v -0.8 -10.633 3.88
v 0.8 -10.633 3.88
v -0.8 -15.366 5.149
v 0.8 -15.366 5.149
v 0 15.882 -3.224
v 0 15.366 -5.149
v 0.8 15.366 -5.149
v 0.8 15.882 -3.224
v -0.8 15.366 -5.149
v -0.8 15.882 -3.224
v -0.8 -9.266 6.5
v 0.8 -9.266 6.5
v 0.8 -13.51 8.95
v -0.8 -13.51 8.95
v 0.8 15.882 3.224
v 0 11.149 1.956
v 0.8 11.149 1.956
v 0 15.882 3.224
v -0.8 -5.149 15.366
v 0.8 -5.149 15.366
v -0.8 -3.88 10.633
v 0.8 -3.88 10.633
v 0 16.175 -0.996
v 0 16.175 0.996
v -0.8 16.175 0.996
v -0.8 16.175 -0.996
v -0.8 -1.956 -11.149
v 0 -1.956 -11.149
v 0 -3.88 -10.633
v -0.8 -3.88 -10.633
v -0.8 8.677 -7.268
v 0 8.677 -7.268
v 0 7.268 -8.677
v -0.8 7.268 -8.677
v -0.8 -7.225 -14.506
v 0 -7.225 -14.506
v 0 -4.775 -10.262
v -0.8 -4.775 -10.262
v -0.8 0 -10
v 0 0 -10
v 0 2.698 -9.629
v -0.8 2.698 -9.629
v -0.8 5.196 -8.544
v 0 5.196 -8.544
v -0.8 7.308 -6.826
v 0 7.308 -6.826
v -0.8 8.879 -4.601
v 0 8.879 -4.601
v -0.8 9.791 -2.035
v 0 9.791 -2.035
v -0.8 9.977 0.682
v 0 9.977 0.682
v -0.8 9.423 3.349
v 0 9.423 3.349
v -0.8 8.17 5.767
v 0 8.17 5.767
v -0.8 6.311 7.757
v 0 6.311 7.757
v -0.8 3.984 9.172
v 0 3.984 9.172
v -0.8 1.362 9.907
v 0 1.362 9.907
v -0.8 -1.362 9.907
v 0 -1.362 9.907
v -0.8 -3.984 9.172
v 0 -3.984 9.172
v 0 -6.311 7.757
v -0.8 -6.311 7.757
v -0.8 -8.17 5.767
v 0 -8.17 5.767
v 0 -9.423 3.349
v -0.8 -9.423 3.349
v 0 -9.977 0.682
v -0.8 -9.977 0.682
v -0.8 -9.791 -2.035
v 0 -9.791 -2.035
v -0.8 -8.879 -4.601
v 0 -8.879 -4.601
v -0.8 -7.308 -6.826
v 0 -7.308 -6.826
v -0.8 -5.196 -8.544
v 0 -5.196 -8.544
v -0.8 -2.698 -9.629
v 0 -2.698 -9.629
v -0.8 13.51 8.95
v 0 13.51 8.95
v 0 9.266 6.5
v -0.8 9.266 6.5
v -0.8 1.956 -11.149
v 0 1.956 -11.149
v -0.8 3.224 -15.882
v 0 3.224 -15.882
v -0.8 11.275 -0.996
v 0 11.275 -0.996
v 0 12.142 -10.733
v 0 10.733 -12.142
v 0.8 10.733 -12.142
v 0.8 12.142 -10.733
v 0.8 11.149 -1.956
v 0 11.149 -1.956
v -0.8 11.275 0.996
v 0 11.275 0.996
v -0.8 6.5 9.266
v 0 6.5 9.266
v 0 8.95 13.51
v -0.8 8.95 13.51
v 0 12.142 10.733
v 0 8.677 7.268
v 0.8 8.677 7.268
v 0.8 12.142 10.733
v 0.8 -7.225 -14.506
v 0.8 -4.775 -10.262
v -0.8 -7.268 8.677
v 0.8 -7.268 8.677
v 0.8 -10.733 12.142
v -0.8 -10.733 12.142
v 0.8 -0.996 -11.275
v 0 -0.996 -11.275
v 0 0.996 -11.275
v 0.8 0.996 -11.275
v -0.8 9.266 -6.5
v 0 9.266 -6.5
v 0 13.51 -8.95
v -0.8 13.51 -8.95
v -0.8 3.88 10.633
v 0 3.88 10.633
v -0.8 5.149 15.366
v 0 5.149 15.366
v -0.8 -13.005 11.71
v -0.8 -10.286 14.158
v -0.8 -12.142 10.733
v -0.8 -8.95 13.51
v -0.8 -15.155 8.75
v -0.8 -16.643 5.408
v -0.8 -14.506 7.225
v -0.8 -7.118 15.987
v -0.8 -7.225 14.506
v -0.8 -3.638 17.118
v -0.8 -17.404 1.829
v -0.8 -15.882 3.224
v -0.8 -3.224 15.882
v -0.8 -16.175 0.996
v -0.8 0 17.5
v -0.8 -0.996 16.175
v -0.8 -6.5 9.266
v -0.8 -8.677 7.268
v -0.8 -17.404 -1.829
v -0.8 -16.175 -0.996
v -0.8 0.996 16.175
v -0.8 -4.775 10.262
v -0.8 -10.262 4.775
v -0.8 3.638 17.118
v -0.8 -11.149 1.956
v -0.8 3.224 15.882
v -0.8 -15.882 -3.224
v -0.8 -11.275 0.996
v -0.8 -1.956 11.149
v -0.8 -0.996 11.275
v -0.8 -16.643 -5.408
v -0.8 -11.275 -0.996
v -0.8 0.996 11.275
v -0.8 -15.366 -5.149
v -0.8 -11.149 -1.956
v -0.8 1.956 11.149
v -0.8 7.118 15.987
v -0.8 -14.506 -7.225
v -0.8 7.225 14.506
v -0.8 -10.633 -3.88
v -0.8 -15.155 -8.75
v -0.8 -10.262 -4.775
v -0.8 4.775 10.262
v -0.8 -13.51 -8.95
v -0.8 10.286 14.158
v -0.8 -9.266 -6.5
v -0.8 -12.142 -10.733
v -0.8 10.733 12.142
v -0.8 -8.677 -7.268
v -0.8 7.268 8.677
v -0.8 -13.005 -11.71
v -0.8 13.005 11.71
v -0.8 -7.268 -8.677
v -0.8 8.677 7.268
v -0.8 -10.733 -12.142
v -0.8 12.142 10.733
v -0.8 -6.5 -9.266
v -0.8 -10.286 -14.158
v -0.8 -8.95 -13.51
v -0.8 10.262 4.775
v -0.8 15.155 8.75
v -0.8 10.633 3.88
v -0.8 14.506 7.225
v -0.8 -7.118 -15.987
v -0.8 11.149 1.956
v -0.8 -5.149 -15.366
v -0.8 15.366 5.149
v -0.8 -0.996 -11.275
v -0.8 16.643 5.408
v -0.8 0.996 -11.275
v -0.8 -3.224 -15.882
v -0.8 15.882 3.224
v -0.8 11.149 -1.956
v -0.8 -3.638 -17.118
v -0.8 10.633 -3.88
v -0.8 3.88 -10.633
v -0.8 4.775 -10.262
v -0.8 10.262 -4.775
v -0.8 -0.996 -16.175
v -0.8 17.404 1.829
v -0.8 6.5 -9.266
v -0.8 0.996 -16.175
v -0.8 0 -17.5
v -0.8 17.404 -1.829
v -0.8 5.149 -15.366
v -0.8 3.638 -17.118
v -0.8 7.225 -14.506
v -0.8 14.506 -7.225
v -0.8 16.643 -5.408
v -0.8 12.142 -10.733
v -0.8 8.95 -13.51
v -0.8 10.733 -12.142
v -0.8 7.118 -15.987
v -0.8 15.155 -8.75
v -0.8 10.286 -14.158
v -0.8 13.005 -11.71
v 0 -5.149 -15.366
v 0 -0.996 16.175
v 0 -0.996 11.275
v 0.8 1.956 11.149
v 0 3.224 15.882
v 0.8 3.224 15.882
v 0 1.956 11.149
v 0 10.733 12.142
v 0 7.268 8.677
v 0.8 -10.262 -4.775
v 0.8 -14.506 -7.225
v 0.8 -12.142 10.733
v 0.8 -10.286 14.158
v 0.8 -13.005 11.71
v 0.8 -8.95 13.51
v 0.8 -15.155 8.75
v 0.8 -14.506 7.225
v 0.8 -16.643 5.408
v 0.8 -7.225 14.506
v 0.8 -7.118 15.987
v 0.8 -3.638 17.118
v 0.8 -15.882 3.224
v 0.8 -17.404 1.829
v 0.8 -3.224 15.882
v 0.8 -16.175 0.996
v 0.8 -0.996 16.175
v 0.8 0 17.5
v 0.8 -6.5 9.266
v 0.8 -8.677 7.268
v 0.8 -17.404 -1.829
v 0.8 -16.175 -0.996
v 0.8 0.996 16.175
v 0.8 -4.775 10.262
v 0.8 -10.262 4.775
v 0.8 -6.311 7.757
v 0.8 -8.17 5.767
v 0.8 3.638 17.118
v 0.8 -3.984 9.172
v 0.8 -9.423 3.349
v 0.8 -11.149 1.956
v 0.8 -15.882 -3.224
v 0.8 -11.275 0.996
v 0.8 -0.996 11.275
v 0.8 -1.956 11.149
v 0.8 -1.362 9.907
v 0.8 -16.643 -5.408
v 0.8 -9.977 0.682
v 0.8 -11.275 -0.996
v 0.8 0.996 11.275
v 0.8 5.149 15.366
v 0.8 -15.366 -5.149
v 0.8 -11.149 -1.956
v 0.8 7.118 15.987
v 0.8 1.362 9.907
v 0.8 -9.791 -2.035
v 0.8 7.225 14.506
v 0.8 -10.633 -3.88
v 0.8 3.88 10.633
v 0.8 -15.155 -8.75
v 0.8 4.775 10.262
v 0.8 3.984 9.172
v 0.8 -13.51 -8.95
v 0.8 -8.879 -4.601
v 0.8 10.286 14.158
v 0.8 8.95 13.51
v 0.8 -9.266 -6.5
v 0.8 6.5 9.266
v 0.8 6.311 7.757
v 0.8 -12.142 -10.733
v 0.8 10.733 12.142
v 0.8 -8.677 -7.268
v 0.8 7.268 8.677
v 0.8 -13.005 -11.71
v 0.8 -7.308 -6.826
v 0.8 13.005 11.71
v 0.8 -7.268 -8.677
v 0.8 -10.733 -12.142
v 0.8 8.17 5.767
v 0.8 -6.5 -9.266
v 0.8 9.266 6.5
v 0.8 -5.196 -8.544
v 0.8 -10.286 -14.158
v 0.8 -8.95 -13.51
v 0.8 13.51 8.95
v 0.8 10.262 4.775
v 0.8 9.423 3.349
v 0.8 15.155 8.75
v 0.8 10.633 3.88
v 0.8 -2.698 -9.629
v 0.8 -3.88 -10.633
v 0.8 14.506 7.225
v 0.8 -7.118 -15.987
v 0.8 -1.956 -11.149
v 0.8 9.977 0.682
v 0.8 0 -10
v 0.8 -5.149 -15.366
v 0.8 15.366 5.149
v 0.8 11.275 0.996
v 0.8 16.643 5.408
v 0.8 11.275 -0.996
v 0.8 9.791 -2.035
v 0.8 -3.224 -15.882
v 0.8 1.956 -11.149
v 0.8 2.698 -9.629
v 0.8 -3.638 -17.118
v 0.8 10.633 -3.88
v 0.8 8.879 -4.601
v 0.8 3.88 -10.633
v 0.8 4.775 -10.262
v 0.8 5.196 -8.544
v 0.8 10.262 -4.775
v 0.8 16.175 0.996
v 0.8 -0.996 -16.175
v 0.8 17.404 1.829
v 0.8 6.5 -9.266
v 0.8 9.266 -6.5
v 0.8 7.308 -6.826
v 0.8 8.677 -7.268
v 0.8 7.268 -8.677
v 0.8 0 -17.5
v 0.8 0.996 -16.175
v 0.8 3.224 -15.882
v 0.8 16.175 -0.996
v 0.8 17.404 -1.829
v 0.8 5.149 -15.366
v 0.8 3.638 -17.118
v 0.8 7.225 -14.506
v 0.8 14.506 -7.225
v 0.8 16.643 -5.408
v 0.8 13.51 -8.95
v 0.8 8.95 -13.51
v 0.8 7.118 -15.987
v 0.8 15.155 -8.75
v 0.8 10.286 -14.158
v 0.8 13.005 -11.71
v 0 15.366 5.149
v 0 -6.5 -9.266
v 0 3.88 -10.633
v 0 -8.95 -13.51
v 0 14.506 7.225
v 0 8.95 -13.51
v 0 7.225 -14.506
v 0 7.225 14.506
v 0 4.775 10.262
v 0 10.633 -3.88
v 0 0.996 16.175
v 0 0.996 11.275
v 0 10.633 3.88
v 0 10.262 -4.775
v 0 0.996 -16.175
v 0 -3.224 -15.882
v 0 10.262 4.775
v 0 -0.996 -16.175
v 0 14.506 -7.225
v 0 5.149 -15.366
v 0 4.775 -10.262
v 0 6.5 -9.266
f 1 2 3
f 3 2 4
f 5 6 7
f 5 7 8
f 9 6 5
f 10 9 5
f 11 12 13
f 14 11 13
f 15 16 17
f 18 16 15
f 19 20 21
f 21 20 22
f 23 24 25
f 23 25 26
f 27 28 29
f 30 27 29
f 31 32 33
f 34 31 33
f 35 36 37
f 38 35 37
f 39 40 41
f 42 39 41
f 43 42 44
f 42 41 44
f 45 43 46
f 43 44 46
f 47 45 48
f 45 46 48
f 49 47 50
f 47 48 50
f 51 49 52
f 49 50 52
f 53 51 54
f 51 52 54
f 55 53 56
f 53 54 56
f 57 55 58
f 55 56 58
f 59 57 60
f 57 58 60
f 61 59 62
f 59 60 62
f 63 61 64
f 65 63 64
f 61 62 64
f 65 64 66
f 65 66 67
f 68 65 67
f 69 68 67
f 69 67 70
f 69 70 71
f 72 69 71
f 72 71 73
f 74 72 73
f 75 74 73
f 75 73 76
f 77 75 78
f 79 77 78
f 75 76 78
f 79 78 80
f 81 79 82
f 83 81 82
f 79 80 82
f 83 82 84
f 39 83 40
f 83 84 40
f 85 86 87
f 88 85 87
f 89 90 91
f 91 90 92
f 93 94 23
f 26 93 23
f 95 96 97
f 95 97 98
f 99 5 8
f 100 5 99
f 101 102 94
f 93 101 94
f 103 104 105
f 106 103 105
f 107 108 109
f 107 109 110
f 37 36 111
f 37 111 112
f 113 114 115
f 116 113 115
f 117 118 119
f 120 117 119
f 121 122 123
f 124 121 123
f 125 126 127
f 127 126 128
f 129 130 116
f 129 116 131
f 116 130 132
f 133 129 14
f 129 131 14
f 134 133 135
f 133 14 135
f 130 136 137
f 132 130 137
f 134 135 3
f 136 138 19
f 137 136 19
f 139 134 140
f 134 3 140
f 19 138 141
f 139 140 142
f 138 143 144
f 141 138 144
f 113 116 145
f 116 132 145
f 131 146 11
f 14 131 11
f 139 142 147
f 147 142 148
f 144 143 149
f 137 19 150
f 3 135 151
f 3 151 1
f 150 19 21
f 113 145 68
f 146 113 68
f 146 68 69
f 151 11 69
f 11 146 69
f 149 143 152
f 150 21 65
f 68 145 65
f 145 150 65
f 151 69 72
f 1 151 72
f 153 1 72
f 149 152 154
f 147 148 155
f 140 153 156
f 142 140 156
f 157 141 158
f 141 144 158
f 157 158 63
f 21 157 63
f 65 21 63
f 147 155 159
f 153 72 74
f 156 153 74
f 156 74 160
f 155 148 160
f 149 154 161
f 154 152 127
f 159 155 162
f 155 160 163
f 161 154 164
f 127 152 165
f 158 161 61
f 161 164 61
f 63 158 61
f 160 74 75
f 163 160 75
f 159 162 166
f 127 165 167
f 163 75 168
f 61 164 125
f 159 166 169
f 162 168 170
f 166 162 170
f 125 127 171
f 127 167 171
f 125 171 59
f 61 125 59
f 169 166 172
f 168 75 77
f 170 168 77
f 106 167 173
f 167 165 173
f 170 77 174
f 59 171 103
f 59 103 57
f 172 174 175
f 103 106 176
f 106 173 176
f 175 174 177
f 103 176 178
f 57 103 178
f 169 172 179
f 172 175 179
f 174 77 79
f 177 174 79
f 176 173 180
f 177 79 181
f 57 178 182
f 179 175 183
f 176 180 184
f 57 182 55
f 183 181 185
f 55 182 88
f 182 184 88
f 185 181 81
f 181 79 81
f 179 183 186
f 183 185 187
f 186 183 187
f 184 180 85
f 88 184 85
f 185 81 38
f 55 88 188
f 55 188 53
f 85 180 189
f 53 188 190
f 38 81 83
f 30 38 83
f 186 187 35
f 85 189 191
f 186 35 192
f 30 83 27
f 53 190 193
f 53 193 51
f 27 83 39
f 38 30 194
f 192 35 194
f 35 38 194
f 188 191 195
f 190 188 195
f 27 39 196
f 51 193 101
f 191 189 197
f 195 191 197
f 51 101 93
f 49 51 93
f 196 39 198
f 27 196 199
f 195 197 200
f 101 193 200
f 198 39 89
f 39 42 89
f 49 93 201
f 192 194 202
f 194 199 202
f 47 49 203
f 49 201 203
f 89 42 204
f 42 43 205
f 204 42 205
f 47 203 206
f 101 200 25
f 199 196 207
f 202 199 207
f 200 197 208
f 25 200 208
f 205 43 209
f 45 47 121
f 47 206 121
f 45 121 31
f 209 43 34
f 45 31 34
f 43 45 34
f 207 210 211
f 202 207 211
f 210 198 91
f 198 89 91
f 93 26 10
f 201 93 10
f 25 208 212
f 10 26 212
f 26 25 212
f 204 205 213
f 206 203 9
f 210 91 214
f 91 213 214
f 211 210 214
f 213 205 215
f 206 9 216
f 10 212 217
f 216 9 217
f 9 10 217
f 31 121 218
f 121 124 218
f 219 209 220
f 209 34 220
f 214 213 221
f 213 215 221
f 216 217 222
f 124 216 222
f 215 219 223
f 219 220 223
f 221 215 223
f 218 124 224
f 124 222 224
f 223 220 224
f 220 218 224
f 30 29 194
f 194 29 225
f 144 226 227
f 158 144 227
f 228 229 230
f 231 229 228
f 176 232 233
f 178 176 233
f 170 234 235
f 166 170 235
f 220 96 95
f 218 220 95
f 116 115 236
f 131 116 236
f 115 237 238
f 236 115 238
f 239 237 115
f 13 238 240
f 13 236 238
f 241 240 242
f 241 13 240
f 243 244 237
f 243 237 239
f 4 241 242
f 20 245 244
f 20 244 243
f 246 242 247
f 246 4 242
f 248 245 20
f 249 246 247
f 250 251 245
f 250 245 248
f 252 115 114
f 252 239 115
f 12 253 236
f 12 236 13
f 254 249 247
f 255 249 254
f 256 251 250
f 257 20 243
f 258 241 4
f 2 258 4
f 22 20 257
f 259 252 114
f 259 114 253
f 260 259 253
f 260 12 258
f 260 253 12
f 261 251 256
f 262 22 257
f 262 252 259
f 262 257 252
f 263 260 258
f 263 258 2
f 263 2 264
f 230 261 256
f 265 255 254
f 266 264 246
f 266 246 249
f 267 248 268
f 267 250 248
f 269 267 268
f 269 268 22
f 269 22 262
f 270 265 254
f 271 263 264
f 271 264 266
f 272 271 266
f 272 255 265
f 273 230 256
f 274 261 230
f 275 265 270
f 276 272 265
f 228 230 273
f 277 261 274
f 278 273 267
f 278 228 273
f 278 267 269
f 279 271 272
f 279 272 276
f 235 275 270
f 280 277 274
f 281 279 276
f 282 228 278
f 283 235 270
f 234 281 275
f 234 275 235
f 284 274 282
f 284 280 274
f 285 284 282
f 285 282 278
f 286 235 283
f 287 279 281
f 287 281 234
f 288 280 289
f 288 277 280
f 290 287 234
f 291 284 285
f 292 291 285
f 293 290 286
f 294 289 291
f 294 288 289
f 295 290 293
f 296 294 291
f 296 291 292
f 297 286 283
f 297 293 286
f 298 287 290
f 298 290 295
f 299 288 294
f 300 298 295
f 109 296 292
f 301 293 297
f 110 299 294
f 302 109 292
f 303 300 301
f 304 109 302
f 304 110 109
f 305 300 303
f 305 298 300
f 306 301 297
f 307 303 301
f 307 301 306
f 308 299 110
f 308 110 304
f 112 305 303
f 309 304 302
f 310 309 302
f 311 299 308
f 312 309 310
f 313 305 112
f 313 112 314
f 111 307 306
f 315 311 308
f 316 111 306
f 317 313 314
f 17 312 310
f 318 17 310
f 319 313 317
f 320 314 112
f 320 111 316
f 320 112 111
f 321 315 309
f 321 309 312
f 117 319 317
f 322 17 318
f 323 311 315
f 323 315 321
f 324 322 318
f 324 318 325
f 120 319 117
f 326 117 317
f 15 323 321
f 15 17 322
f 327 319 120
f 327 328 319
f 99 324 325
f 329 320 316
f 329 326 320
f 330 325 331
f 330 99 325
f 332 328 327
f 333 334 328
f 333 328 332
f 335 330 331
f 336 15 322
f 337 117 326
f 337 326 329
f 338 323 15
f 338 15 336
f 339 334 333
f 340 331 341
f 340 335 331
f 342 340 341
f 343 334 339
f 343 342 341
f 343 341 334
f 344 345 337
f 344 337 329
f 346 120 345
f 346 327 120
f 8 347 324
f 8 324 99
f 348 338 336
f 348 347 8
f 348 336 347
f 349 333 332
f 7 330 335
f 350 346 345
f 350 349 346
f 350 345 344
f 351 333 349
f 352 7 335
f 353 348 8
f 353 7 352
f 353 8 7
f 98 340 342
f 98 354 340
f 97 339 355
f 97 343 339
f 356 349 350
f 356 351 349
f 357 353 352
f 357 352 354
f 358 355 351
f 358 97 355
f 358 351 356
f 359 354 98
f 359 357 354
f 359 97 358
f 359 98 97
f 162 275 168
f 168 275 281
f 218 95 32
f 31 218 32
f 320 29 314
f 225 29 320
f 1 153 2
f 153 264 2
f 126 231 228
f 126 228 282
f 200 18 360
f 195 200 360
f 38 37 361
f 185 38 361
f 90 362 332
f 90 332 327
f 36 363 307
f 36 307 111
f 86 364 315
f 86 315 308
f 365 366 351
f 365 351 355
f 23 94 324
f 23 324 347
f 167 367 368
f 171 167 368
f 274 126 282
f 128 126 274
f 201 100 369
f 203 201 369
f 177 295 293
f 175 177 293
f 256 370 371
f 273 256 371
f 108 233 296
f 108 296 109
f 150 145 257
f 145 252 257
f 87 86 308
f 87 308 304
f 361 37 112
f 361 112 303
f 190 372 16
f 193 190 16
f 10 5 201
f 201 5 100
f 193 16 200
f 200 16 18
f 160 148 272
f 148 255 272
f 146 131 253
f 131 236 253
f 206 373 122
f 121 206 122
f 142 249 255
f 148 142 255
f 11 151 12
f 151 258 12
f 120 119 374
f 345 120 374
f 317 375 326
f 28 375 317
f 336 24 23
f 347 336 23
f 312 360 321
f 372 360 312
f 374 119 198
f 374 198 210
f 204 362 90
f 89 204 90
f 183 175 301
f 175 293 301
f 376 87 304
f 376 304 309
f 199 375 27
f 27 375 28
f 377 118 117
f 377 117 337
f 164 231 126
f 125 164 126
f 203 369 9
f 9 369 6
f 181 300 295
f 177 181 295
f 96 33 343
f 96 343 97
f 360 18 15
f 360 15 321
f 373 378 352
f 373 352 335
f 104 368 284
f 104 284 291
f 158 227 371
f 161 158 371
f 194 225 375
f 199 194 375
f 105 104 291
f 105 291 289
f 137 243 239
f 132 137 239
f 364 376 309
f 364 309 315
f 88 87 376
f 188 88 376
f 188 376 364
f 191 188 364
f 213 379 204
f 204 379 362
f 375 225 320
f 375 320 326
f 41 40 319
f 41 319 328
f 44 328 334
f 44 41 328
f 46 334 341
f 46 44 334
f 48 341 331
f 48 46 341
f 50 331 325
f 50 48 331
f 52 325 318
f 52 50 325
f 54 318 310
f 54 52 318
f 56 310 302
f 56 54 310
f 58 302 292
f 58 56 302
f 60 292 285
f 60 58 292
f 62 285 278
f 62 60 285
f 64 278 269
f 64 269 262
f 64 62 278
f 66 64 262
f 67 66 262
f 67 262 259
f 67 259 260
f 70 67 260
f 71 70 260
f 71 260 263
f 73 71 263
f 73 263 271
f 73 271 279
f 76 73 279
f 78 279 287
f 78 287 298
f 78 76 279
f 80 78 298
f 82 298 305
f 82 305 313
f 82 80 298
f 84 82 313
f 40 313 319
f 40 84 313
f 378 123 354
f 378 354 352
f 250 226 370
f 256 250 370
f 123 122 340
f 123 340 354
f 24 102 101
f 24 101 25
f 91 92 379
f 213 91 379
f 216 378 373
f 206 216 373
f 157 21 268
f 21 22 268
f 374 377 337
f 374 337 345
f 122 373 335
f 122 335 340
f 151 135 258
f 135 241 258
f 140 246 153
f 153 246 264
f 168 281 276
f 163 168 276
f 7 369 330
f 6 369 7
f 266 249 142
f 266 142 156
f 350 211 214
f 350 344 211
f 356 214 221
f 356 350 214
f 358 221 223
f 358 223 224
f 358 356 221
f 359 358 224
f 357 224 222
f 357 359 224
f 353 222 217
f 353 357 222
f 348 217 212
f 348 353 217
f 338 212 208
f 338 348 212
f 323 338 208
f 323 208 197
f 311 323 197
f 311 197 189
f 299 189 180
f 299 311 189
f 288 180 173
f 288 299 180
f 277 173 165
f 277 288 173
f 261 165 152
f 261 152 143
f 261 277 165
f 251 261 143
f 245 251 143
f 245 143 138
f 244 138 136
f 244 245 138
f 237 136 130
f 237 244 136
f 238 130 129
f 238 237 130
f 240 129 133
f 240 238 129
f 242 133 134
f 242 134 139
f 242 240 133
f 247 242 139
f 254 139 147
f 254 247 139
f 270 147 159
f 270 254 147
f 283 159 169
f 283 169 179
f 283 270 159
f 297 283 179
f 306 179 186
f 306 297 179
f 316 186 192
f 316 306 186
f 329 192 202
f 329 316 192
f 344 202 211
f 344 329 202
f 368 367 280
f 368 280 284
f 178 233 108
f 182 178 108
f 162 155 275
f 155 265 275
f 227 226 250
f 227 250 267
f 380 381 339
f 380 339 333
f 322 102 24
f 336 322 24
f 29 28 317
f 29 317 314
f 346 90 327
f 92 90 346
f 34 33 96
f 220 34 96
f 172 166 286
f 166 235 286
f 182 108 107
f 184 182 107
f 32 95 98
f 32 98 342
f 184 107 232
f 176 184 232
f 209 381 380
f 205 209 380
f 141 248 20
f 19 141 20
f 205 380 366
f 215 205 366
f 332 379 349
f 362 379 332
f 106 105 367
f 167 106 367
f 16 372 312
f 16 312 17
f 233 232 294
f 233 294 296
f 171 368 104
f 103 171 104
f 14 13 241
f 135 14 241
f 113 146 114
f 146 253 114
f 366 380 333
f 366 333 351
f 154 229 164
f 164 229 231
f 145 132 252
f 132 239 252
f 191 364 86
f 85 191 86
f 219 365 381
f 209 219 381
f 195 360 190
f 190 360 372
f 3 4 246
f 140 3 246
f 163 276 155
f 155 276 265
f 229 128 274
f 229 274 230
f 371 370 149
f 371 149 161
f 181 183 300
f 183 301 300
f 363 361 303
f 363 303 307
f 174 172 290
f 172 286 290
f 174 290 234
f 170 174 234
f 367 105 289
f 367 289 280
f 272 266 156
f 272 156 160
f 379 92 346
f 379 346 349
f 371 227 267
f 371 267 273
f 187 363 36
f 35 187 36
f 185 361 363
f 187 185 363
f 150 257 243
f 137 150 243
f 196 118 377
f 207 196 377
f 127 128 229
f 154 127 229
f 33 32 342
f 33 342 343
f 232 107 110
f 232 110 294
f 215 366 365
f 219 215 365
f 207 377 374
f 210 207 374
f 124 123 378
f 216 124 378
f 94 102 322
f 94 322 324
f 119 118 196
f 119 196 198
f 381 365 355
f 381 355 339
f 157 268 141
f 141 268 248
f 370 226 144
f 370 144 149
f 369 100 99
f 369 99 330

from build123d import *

# Parameters (mm, degrees)
BOSS_EXTRUDE1_DEPTH      = 0.8
BOSS_EXTRUDE1_DEPTH_BACK = 0.8
SKETCH1_R                = 17.5
SKETCH1_R_2              = 10
SKETCH1_W                = 4.9
SKETCH1_H                = 1.992179872
SKETCH1_W_2              = 1.992179872
SKETCH1_H_2              = 4.9


with BuildPart() as part:
    # Sketch1 → Boss-Extrude1 (new, two sides: drawn at the far end of the back side and taken through both)
    with BuildSketch(Plane(origin=(0, 0, 0), x_dir=(0, 0, -1), z_dir=(1, 0, 0)).offset(-BOSS_EXTRUDE1_DEPTH_BACK)):
        Circle(SKETCH1_R)
        Circle(SKETCH1_R_2, mode=Mode.SUBTRACT)
        with Locations((13.725, 0)):
            Rectangle(SKETCH1_W, SKETCH1_H, mode=Mode.SUBTRACT)
        Polygon((10.633006645, 3.880333728), (11.148620737, 1.956035739), (15.881657286, 3.22424906), (15.366043194, 5.148547049), align=None, mode=Mode.SUBTRACT)
        Polygon((10.633006645, -3.880333728), (15.366043194, -5.148547049), (15.881657286, -3.22424906), (11.148620737, -1.956035739), align=None, mode=Mode.SUBTRACT)
        Polygon((9.26639146, 6.500139189), (10.262481396, 4.774860811), (14.506005874, 7.224860811), (13.509915938, 8.950139189), align=None, mode=Mode.SUBTRACT)
        Polygon((9.26639146, -6.500139189), (13.509915938, -8.950139189), (14.506005874, -7.224860811), (10.262481396, -4.774860811), align=None, mode=Mode.SUBTRACT)
        Polygon((7.26828701, 8.676970906), (8.676970906, 7.26828701), (12.141794134, 10.733110237), (10.733110237, 12.141794134), align=None, mode=Mode.SUBTRACT)
        Polygon((7.26828701, -8.676970906), (10.733110237, -12.141794134), (12.141794134, -10.733110237), (8.676970906, -7.26828701), align=None, mode=Mode.SUBTRACT)
        Polygon((4.774860811, 10.262481396), (6.500139189, 9.26639146), (8.950139189, 13.509915938), (7.224860811, 14.506005874), align=None, mode=Mode.SUBTRACT)
        Polygon((4.774860811, -10.262481396), (7.224860811, -14.506005874), (8.950139189, -13.509915938), (6.500139189, -9.26639146), align=None, mode=Mode.SUBTRACT)
        Polygon((1.956035739, 11.148620737), (3.880333728, 10.633006645), (5.148547049, 15.366043194), (3.22424906, 15.881657286), align=None, mode=Mode.SUBTRACT)
        Polygon((1.956035739, -11.148620737), (3.22424906, -15.881657286), (5.148547049, -15.366043194), (3.880333728, -10.633006645), align=None, mode=Mode.SUBTRACT)
        with Locations((0, 13.725)):
            Rectangle(SKETCH1_W_2, SKETCH1_H_2, mode=Mode.SUBTRACT)
        with Locations((0, -13.725)):
            Rectangle(SKETCH1_W_2, SKETCH1_H_2, mode=Mode.SUBTRACT)
        Polygon((-5.148547049, 15.366043194), (-3.880333728, 10.633006645), (-1.956035739, 11.148620737), (-3.22424906, 15.881657286), align=None, mode=Mode.SUBTRACT)
        Polygon((-5.148547049, -15.366043194), (-3.22424906, -15.881657286), (-1.956035739, -11.148620737), (-3.880333728, -10.633006645), align=None, mode=Mode.SUBTRACT)
        Polygon((-8.950139189, 13.509915938), (-6.500139189, 9.26639146), (-4.774860811, 10.262481396), (-7.224860811, 14.506005874), align=None, mode=Mode.SUBTRACT)
        Polygon((-8.950139189, -13.509915938), (-7.224860811, -14.506005874), (-4.774860811, -10.262481396), (-6.500139189, -9.26639146), align=None, mode=Mode.SUBTRACT)
        Polygon((-12.141794134, 10.733110237), (-8.676970906, 7.26828701), (-7.26828701, 8.676970906), (-10.733110237, 12.141794134), align=None, mode=Mode.SUBTRACT)
        Polygon((-12.141794134, -10.733110237), (-10.733110237, -12.141794134), (-7.26828701, -8.676970906), (-8.676970906, -7.26828701), align=None, mode=Mode.SUBTRACT)
        Polygon((-14.506005874, 7.224860811), (-10.262481396, 4.774860811), (-9.26639146, 6.500139189), (-13.509915938, 8.950139189), align=None, mode=Mode.SUBTRACT)
        Polygon((-14.506005874, -7.224860811), (-13.509915938, -8.950139189), (-9.26639146, -6.500139189), (-10.262481396, -4.774860811), align=None, mode=Mode.SUBTRACT)
        Polygon((-15.881657286, 3.22424906), (-11.148620737, 1.956035739), (-10.633006645, 3.880333728), (-15.366043194, 5.148547049), align=None, mode=Mode.SUBTRACT)
        Polygon((-15.881657286, -3.22424906), (-15.366043194, -5.148547049), (-10.633006645, -3.880333728), (-11.148620737, -1.956035739), align=None, mode=Mode.SUBTRACT)
        with Locations((-13.725, 0)):
            Rectangle(SKETCH1_W, SKETCH1_H, mode=Mode.SUBTRACT)
    extrude(amount=BOSS_EXTRUDE1_DEPTH + BOSS_EXTRUDE1_DEPTH_BACK)


solid = part.part
